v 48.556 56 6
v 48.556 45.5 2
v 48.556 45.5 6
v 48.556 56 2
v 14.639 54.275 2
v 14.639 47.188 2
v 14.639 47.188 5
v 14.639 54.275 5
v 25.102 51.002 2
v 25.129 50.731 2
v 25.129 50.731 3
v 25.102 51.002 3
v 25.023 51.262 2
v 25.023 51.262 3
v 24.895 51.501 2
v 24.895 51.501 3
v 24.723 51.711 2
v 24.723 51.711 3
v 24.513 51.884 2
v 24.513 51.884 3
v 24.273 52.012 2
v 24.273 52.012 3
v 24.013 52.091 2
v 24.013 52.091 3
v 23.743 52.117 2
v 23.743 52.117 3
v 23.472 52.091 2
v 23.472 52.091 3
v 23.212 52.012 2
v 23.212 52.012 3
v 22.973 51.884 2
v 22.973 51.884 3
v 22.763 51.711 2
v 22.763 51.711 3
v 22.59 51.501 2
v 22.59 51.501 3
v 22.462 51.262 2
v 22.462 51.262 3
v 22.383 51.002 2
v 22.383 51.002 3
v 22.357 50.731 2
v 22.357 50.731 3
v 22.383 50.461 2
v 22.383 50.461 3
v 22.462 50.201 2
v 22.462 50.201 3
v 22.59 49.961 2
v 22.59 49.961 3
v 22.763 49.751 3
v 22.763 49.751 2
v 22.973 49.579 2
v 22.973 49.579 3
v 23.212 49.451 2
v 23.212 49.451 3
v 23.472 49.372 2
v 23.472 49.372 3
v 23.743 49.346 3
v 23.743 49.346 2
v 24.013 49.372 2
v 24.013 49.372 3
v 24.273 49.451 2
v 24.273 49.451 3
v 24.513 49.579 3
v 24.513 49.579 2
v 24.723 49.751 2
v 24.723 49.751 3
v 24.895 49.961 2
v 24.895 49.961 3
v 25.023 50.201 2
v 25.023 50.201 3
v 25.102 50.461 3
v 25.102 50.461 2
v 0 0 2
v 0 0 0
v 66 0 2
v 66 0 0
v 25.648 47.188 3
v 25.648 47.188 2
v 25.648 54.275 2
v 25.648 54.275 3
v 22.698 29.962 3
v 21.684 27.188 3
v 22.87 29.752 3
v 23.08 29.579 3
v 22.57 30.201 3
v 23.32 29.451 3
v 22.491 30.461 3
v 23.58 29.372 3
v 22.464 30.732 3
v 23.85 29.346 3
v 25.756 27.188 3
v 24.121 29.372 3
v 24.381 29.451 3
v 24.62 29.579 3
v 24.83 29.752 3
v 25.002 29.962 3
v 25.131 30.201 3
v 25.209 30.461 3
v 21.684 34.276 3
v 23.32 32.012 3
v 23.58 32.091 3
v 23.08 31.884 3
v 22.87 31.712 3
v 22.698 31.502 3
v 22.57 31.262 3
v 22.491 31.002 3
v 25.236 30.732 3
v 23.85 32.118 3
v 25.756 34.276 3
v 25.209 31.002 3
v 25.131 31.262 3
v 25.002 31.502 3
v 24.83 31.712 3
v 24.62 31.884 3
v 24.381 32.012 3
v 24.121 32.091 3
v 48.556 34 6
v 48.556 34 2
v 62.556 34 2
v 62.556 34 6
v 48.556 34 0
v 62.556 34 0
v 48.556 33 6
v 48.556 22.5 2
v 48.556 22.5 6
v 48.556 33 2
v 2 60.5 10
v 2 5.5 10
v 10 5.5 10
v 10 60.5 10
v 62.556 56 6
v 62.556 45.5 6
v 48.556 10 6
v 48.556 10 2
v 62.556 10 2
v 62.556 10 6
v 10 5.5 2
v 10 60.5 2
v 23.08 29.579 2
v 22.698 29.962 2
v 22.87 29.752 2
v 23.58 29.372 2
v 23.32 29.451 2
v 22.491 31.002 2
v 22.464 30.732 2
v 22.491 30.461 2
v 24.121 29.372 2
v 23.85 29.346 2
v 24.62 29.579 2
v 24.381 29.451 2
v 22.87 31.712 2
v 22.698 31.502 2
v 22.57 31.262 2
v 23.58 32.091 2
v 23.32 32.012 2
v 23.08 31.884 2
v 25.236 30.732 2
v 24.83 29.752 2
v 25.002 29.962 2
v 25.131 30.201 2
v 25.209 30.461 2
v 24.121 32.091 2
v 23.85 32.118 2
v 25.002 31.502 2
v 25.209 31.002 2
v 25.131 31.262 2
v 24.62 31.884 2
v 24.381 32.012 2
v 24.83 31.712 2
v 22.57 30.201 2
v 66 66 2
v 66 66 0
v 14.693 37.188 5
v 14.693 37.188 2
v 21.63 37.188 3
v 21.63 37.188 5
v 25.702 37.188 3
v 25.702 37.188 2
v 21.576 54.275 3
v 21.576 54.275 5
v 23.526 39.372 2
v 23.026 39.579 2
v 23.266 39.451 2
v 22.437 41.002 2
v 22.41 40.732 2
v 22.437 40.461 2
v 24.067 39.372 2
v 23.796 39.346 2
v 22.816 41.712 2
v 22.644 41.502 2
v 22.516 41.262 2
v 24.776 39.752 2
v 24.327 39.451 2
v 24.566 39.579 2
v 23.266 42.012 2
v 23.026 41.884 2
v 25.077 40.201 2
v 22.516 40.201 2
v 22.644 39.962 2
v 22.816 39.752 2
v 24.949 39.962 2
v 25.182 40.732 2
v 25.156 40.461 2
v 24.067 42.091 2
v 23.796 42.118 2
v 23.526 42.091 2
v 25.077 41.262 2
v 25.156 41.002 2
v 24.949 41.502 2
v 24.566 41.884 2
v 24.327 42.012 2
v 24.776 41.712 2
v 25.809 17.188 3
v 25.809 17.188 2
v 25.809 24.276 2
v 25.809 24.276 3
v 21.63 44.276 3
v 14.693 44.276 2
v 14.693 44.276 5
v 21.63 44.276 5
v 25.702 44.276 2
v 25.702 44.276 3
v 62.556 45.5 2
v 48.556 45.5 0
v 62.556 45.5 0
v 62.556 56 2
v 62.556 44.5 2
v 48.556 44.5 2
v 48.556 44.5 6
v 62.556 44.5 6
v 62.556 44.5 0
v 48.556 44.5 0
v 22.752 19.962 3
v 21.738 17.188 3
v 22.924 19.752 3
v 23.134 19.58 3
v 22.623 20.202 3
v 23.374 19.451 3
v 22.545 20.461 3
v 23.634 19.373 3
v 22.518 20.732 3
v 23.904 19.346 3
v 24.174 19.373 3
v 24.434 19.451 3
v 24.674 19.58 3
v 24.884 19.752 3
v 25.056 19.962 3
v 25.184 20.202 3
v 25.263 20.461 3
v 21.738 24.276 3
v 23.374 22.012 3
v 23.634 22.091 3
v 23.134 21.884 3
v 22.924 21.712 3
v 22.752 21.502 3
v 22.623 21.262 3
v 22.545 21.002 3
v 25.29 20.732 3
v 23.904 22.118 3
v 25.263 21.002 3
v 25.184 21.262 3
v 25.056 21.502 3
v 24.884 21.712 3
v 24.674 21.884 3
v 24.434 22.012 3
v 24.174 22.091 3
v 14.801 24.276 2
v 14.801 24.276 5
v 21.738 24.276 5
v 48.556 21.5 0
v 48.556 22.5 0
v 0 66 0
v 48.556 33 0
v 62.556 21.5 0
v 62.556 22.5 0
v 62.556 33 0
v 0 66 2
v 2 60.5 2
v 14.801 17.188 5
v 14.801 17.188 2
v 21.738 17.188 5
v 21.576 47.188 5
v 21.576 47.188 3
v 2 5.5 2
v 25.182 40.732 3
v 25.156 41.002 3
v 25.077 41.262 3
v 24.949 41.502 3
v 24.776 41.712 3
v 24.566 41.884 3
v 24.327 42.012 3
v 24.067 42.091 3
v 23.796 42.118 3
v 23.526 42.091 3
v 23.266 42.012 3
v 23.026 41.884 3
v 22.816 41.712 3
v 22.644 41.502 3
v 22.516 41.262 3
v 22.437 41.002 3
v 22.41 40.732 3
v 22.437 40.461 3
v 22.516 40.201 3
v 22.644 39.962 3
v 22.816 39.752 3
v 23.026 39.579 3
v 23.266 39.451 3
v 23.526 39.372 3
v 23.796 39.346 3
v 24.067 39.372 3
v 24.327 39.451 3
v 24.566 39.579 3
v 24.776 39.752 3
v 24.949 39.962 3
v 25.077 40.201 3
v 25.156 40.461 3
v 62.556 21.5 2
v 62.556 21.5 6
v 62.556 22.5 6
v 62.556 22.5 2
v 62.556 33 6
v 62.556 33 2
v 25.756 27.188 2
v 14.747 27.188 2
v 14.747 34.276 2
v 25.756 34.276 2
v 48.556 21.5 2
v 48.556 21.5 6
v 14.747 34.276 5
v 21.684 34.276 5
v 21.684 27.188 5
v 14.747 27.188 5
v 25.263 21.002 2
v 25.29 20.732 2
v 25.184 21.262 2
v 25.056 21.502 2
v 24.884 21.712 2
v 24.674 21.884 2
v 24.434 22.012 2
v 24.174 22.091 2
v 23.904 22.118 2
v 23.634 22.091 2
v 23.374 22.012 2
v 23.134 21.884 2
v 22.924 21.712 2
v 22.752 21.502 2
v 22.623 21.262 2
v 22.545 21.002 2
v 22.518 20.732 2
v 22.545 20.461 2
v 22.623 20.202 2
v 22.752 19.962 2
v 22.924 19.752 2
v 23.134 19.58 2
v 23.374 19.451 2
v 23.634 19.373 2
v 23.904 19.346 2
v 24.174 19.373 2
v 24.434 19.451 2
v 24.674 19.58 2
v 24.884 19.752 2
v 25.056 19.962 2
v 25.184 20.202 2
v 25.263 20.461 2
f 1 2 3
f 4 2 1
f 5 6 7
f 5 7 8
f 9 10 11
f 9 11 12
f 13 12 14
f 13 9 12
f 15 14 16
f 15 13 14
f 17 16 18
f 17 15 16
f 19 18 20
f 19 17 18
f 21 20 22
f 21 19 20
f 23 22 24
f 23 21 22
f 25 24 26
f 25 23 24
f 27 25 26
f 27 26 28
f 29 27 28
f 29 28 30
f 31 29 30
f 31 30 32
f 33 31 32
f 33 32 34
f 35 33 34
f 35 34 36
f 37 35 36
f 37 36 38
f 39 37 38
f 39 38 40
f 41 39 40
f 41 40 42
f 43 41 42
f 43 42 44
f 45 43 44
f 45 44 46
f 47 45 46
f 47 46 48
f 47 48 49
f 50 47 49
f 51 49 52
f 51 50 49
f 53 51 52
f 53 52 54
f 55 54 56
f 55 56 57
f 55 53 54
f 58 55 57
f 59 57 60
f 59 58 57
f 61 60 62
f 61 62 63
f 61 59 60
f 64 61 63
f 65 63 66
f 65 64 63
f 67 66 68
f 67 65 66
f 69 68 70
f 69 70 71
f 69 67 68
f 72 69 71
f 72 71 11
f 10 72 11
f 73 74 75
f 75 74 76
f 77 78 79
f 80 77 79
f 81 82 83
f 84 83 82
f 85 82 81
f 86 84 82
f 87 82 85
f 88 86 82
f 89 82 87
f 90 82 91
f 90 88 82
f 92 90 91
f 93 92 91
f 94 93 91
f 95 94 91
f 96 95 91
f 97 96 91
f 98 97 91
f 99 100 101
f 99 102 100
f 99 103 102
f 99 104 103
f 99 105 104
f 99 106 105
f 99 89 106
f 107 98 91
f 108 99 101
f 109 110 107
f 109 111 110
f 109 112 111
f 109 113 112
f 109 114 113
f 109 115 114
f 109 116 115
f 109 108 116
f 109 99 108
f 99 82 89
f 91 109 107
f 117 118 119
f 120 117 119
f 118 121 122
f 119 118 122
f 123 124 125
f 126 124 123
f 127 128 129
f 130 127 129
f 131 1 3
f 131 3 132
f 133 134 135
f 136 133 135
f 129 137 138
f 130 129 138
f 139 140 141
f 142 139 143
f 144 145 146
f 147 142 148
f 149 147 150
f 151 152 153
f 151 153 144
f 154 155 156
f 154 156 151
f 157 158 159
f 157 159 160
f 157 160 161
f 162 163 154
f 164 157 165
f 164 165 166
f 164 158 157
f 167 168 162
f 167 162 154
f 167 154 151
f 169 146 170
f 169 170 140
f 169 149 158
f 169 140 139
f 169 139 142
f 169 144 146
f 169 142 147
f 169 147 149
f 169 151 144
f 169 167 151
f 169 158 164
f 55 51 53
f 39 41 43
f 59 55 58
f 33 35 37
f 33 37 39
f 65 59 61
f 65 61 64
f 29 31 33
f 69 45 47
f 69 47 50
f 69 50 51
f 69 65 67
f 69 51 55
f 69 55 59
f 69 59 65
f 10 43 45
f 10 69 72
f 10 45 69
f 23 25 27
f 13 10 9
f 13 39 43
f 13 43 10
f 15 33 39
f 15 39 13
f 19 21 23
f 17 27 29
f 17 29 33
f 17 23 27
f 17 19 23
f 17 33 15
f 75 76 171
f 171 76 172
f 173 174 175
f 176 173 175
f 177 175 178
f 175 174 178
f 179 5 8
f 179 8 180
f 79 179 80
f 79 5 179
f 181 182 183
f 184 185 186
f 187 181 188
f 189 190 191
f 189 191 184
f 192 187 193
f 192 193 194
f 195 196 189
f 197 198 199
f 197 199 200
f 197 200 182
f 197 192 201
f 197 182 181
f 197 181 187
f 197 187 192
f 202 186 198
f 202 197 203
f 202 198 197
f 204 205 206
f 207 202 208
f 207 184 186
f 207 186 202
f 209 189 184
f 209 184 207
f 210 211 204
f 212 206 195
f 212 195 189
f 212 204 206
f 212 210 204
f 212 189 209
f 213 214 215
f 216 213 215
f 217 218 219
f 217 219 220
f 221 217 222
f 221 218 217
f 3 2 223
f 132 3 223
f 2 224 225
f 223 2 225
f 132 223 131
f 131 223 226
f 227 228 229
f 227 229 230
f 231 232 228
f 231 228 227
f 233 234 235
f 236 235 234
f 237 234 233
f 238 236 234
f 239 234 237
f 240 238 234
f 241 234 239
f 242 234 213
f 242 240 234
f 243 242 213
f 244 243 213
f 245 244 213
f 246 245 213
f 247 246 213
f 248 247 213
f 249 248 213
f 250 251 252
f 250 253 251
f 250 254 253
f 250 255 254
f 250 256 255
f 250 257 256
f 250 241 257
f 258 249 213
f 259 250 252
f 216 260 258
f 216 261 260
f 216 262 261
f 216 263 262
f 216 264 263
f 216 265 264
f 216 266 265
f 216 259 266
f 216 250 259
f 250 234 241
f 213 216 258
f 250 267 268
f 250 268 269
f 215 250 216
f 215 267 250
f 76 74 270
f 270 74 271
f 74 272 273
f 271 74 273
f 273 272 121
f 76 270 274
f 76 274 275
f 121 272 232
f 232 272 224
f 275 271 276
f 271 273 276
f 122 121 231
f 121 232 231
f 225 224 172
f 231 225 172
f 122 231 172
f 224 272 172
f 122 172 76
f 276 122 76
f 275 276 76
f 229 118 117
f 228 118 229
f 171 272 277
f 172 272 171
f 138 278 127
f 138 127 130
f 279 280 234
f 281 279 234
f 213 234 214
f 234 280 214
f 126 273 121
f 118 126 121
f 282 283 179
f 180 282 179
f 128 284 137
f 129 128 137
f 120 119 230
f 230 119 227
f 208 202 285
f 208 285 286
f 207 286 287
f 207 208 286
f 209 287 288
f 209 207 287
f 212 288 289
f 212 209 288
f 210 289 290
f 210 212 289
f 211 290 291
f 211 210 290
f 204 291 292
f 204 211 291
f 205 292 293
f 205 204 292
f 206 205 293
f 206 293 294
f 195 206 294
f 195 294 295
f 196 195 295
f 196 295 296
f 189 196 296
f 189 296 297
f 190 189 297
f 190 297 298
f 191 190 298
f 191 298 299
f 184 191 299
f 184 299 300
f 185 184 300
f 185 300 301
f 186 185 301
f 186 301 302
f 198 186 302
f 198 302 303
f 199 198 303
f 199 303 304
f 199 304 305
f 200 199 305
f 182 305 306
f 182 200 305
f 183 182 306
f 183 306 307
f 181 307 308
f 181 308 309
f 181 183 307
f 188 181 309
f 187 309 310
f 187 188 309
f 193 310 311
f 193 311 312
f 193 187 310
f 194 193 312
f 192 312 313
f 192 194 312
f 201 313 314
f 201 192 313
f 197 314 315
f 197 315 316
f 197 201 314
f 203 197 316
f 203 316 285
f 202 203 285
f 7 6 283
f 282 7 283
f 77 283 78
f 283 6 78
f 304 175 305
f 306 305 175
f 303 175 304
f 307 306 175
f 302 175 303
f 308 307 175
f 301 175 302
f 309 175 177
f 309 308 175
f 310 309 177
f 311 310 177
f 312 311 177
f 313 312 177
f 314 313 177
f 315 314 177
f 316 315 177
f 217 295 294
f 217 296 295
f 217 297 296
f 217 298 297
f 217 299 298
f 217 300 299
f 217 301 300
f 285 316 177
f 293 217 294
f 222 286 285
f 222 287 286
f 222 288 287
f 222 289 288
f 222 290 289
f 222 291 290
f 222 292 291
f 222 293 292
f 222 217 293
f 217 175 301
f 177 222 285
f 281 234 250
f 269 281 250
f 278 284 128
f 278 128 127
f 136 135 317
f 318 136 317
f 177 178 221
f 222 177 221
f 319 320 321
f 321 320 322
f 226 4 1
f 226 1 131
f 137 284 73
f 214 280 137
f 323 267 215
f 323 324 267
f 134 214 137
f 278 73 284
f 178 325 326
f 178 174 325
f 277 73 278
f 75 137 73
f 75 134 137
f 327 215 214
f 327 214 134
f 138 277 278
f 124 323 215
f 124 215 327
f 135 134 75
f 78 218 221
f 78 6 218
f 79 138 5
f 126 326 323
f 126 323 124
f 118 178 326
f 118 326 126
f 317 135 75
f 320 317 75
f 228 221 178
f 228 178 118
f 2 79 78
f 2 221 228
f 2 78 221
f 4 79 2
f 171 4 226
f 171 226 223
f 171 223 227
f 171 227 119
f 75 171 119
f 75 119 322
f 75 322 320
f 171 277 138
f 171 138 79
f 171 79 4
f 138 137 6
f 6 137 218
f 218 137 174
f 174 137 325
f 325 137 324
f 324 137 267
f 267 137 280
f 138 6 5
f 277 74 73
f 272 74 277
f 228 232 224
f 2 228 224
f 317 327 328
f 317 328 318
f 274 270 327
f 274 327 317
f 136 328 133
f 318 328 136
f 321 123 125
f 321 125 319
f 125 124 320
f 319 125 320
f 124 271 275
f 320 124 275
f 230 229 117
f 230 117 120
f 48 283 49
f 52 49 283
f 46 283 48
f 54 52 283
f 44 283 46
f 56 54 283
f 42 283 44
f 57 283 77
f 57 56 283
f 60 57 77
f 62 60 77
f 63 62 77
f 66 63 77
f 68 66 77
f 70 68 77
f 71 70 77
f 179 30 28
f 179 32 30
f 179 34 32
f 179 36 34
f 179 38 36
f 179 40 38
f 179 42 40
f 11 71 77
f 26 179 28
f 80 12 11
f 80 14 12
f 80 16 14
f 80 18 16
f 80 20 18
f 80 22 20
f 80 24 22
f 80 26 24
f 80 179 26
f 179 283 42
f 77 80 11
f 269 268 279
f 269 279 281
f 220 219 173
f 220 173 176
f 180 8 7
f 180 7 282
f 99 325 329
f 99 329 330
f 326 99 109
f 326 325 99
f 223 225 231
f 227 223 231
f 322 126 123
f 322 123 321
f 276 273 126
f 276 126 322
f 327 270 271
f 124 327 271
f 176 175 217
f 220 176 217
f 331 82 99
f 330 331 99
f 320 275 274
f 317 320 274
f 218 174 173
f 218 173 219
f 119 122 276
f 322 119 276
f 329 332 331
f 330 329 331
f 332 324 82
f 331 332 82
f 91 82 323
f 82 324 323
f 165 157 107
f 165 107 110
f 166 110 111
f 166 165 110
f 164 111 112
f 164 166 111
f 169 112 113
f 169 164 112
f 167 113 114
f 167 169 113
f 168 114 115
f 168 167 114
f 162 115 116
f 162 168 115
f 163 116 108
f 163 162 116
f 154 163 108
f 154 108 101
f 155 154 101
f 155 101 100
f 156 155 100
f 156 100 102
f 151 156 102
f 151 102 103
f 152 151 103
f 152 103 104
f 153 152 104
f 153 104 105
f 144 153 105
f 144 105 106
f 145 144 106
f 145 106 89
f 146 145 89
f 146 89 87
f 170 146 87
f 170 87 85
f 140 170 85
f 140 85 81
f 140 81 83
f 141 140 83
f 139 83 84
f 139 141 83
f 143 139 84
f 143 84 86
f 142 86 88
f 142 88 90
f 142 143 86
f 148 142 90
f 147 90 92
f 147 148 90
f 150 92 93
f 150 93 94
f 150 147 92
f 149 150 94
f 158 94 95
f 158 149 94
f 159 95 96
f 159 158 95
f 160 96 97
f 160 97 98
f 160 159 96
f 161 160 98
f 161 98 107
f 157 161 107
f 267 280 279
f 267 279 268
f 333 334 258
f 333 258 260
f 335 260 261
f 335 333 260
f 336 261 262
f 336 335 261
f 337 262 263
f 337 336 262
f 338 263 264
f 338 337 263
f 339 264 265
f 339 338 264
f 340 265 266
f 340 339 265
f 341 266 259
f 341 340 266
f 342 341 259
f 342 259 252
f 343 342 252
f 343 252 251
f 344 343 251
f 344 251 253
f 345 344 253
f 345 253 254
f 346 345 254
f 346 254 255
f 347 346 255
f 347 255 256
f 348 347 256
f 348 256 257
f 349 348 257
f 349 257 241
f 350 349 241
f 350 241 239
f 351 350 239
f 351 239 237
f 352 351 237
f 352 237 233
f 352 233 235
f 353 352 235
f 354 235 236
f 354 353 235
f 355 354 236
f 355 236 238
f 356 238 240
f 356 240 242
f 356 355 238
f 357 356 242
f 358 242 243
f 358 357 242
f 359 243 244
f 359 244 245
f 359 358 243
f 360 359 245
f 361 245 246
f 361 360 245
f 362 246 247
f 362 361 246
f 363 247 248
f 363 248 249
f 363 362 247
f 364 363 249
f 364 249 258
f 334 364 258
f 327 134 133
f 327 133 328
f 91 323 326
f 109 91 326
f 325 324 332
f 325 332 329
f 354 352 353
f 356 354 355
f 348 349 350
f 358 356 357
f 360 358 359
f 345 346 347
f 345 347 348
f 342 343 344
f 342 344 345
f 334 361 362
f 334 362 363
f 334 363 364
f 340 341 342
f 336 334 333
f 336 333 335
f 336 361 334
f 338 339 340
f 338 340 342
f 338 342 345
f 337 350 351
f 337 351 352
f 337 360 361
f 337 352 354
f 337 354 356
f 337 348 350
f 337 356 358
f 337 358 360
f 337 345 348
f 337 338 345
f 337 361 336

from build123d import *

# Parameters (mm, degrees)
F0_W     = 66
F0_H     = 66
F0_W_2   = 8
F0_H_2   = 55
F1_DEPTH = 2
F0_W_3   = 14
F0_H_3   = 10.5
F0_H_4   = 11.5
F2_DEPTH = 6
F3_DEPTH = 10
F0_W_4   = 4.0717534721
F0_H_5   = 7.087867707
F0_R     = 1.3859466119
F4_DEPTH = 3
F0_W_5   = 6.9370614365
F5_DEPTH = 5
F6_DEPTH = 2


with BuildPart() as f1:
    # F0 (on Top) → F1 (new body)
    with BuildSketch(Plane.XY):
        with Locations((33, 33)):
            Rectangle(F0_W, F0_H)
        Polygon((21.7376640153, 17.1879483869), (14.8006025788, 17.1879483869), (14.8006025788, 24.275816094), (21.7376640153, 24.275816094), (25.8094174874, 24.275816094), (25.8094174874, 17.1879483869), align=None, mode=Mode.SUBTRACT)
        Polygon((21.6838878947, 27.1878037923), (14.7468264583, 27.1878037923), (14.7468264583, 34.2756714994), (21.6838878947, 34.2756714994), (25.7556413668, 34.2756714994), (25.7556413668, 27.1878037923), align=None, mode=Mode.SUBTRACT)
        with Locations((6, 33)):
            Rectangle(F0_W_2, F0_H_2, mode=Mode.SUBTRACT)
        Polygon((21.6301117742, 37.1876591977), (14.6930503377, 37.1876591977), (14.6930503377, 44.2755269048), (21.6301117742, 44.2755269048), (25.7018652463, 44.2755269048), (25.7018652463, 37.1876591977), align=None, mode=Mode.SUBTRACT)
        Polygon((21.5763356537, 47.1875146031), (14.6392742172, 47.1875146031), (14.6392742172, 54.2753823102), (21.5763356537, 54.2753823102), (25.6480891258, 54.2753823102), (25.6480891258, 47.1875146031), align=None, mode=Mode.SUBTRACT)
        Polygon((48.5562719405, 45.5), (48.5562719405, 56), (62.5562719405, 56), (62.5562719405, 45.5), (62.5562719405, 44.5), (62.5562719405, 34), (62.5562719405, 33), (62.5562719405, 22.5), (62.5562719405, 21.5), (62.5562719405, 10), (48.5562719405, 10), (48.5562719405, 21.5), (48.5562719405, 22.5), (48.5562719405, 33), (48.5562719405, 34), (48.5562719405, 44.5), align=None, mode=Mode.SUBTRACT)
    extrude(amount=F1_DEPTH)

    # F0 (on Top) → F2 (join)
    with BuildSketch(Plane.XY):
        with Locations((55.5562719405, 50.75)):
            Rectangle(F0_W_3, F0_H_3)
        with Locations((55.5562719405, 39.25)):
            Rectangle(F0_W_3, F0_H_3)
        with Locations((55.5562719405, 27.75)):
            Rectangle(F0_W_3, F0_H_3)
        with Locations((55.5562719405, 15.75)):
            Rectangle(F0_W_3, F0_H_4)
    extrude(amount=F2_DEPTH)

    # F0 (on Top) → F3 (join)
    with BuildSketch(Plane.XY):
        with Locations((6, 33)):
            Rectangle(F0_W_2, F0_H_2)
    extrude(amount=F3_DEPTH)

    # F0 (on Top) → F4 (join)
    with BuildSketch(Plane.XY):
        with Locations((23.6122123897, 50.7314484566)):
            Rectangle(F0_W_4, F0_H_5)
        with Locations((23.7425714731, 50.7314484566)):
            Circle(F0_R, mode=Mode.SUBTRACT)
        with Locations((23.6659885103, 40.7315930512)):
            Rectangle(F0_W_4, F0_H_5)
        with Locations((23.7963475937, 40.7315930512)):
            Circle(F0_R, mode=Mode.SUBTRACT)
        with Locations((23.7197646308, 30.7317376458)):
            Rectangle(F0_W_4, F0_H_5)
        with Locations((23.8501237142, 30.7317376458)):
            Circle(F0_R, mode=Mode.SUBTRACT)
        with Locations((23.7735407513, 20.7318822405)):
            Rectangle(F0_W_4, F0_H_5)
        with Locations((23.9038998348, 20.7318822405)):
            Circle(F0_R, mode=Mode.SUBTRACT)
    extrude(amount=F4_DEPTH)

    # F0 (on Top) → F5 (join)
    with BuildSketch(Plane.XY):
        with Locations((18.1078049354, 50.7314484566)):
            Rectangle(F0_W_5, F0_H_5)
        with Locations((18.161581056, 40.7315930512)):
            Rectangle(F0_W_5, F0_H_5)
        with Locations((18.2153571765, 30.7317376458)):
            Rectangle(F0_W_5, F0_H_5)
        with Locations((18.2691332971, 20.7318822405)):
            Rectangle(F0_W_5, F0_H_5)
    extrude(amount=F5_DEPTH)

    # F0 (on Top) → F6 (join)
    with BuildSketch(Plane.XY):
        with Locations((23.7425714731, 50.7314484566)):
            Circle(F0_R)
        with Locations((23.7963475937, 40.7315930512)):
            Circle(F0_R)
        with Locations((23.8501237142, 30.7317376458)):
            Circle(F0_R)
        with Locations((23.9038998348, 20.7318822405)):
            Circle(F0_R)
    extrude(amount=F6_DEPTH)


solid = f1.part
